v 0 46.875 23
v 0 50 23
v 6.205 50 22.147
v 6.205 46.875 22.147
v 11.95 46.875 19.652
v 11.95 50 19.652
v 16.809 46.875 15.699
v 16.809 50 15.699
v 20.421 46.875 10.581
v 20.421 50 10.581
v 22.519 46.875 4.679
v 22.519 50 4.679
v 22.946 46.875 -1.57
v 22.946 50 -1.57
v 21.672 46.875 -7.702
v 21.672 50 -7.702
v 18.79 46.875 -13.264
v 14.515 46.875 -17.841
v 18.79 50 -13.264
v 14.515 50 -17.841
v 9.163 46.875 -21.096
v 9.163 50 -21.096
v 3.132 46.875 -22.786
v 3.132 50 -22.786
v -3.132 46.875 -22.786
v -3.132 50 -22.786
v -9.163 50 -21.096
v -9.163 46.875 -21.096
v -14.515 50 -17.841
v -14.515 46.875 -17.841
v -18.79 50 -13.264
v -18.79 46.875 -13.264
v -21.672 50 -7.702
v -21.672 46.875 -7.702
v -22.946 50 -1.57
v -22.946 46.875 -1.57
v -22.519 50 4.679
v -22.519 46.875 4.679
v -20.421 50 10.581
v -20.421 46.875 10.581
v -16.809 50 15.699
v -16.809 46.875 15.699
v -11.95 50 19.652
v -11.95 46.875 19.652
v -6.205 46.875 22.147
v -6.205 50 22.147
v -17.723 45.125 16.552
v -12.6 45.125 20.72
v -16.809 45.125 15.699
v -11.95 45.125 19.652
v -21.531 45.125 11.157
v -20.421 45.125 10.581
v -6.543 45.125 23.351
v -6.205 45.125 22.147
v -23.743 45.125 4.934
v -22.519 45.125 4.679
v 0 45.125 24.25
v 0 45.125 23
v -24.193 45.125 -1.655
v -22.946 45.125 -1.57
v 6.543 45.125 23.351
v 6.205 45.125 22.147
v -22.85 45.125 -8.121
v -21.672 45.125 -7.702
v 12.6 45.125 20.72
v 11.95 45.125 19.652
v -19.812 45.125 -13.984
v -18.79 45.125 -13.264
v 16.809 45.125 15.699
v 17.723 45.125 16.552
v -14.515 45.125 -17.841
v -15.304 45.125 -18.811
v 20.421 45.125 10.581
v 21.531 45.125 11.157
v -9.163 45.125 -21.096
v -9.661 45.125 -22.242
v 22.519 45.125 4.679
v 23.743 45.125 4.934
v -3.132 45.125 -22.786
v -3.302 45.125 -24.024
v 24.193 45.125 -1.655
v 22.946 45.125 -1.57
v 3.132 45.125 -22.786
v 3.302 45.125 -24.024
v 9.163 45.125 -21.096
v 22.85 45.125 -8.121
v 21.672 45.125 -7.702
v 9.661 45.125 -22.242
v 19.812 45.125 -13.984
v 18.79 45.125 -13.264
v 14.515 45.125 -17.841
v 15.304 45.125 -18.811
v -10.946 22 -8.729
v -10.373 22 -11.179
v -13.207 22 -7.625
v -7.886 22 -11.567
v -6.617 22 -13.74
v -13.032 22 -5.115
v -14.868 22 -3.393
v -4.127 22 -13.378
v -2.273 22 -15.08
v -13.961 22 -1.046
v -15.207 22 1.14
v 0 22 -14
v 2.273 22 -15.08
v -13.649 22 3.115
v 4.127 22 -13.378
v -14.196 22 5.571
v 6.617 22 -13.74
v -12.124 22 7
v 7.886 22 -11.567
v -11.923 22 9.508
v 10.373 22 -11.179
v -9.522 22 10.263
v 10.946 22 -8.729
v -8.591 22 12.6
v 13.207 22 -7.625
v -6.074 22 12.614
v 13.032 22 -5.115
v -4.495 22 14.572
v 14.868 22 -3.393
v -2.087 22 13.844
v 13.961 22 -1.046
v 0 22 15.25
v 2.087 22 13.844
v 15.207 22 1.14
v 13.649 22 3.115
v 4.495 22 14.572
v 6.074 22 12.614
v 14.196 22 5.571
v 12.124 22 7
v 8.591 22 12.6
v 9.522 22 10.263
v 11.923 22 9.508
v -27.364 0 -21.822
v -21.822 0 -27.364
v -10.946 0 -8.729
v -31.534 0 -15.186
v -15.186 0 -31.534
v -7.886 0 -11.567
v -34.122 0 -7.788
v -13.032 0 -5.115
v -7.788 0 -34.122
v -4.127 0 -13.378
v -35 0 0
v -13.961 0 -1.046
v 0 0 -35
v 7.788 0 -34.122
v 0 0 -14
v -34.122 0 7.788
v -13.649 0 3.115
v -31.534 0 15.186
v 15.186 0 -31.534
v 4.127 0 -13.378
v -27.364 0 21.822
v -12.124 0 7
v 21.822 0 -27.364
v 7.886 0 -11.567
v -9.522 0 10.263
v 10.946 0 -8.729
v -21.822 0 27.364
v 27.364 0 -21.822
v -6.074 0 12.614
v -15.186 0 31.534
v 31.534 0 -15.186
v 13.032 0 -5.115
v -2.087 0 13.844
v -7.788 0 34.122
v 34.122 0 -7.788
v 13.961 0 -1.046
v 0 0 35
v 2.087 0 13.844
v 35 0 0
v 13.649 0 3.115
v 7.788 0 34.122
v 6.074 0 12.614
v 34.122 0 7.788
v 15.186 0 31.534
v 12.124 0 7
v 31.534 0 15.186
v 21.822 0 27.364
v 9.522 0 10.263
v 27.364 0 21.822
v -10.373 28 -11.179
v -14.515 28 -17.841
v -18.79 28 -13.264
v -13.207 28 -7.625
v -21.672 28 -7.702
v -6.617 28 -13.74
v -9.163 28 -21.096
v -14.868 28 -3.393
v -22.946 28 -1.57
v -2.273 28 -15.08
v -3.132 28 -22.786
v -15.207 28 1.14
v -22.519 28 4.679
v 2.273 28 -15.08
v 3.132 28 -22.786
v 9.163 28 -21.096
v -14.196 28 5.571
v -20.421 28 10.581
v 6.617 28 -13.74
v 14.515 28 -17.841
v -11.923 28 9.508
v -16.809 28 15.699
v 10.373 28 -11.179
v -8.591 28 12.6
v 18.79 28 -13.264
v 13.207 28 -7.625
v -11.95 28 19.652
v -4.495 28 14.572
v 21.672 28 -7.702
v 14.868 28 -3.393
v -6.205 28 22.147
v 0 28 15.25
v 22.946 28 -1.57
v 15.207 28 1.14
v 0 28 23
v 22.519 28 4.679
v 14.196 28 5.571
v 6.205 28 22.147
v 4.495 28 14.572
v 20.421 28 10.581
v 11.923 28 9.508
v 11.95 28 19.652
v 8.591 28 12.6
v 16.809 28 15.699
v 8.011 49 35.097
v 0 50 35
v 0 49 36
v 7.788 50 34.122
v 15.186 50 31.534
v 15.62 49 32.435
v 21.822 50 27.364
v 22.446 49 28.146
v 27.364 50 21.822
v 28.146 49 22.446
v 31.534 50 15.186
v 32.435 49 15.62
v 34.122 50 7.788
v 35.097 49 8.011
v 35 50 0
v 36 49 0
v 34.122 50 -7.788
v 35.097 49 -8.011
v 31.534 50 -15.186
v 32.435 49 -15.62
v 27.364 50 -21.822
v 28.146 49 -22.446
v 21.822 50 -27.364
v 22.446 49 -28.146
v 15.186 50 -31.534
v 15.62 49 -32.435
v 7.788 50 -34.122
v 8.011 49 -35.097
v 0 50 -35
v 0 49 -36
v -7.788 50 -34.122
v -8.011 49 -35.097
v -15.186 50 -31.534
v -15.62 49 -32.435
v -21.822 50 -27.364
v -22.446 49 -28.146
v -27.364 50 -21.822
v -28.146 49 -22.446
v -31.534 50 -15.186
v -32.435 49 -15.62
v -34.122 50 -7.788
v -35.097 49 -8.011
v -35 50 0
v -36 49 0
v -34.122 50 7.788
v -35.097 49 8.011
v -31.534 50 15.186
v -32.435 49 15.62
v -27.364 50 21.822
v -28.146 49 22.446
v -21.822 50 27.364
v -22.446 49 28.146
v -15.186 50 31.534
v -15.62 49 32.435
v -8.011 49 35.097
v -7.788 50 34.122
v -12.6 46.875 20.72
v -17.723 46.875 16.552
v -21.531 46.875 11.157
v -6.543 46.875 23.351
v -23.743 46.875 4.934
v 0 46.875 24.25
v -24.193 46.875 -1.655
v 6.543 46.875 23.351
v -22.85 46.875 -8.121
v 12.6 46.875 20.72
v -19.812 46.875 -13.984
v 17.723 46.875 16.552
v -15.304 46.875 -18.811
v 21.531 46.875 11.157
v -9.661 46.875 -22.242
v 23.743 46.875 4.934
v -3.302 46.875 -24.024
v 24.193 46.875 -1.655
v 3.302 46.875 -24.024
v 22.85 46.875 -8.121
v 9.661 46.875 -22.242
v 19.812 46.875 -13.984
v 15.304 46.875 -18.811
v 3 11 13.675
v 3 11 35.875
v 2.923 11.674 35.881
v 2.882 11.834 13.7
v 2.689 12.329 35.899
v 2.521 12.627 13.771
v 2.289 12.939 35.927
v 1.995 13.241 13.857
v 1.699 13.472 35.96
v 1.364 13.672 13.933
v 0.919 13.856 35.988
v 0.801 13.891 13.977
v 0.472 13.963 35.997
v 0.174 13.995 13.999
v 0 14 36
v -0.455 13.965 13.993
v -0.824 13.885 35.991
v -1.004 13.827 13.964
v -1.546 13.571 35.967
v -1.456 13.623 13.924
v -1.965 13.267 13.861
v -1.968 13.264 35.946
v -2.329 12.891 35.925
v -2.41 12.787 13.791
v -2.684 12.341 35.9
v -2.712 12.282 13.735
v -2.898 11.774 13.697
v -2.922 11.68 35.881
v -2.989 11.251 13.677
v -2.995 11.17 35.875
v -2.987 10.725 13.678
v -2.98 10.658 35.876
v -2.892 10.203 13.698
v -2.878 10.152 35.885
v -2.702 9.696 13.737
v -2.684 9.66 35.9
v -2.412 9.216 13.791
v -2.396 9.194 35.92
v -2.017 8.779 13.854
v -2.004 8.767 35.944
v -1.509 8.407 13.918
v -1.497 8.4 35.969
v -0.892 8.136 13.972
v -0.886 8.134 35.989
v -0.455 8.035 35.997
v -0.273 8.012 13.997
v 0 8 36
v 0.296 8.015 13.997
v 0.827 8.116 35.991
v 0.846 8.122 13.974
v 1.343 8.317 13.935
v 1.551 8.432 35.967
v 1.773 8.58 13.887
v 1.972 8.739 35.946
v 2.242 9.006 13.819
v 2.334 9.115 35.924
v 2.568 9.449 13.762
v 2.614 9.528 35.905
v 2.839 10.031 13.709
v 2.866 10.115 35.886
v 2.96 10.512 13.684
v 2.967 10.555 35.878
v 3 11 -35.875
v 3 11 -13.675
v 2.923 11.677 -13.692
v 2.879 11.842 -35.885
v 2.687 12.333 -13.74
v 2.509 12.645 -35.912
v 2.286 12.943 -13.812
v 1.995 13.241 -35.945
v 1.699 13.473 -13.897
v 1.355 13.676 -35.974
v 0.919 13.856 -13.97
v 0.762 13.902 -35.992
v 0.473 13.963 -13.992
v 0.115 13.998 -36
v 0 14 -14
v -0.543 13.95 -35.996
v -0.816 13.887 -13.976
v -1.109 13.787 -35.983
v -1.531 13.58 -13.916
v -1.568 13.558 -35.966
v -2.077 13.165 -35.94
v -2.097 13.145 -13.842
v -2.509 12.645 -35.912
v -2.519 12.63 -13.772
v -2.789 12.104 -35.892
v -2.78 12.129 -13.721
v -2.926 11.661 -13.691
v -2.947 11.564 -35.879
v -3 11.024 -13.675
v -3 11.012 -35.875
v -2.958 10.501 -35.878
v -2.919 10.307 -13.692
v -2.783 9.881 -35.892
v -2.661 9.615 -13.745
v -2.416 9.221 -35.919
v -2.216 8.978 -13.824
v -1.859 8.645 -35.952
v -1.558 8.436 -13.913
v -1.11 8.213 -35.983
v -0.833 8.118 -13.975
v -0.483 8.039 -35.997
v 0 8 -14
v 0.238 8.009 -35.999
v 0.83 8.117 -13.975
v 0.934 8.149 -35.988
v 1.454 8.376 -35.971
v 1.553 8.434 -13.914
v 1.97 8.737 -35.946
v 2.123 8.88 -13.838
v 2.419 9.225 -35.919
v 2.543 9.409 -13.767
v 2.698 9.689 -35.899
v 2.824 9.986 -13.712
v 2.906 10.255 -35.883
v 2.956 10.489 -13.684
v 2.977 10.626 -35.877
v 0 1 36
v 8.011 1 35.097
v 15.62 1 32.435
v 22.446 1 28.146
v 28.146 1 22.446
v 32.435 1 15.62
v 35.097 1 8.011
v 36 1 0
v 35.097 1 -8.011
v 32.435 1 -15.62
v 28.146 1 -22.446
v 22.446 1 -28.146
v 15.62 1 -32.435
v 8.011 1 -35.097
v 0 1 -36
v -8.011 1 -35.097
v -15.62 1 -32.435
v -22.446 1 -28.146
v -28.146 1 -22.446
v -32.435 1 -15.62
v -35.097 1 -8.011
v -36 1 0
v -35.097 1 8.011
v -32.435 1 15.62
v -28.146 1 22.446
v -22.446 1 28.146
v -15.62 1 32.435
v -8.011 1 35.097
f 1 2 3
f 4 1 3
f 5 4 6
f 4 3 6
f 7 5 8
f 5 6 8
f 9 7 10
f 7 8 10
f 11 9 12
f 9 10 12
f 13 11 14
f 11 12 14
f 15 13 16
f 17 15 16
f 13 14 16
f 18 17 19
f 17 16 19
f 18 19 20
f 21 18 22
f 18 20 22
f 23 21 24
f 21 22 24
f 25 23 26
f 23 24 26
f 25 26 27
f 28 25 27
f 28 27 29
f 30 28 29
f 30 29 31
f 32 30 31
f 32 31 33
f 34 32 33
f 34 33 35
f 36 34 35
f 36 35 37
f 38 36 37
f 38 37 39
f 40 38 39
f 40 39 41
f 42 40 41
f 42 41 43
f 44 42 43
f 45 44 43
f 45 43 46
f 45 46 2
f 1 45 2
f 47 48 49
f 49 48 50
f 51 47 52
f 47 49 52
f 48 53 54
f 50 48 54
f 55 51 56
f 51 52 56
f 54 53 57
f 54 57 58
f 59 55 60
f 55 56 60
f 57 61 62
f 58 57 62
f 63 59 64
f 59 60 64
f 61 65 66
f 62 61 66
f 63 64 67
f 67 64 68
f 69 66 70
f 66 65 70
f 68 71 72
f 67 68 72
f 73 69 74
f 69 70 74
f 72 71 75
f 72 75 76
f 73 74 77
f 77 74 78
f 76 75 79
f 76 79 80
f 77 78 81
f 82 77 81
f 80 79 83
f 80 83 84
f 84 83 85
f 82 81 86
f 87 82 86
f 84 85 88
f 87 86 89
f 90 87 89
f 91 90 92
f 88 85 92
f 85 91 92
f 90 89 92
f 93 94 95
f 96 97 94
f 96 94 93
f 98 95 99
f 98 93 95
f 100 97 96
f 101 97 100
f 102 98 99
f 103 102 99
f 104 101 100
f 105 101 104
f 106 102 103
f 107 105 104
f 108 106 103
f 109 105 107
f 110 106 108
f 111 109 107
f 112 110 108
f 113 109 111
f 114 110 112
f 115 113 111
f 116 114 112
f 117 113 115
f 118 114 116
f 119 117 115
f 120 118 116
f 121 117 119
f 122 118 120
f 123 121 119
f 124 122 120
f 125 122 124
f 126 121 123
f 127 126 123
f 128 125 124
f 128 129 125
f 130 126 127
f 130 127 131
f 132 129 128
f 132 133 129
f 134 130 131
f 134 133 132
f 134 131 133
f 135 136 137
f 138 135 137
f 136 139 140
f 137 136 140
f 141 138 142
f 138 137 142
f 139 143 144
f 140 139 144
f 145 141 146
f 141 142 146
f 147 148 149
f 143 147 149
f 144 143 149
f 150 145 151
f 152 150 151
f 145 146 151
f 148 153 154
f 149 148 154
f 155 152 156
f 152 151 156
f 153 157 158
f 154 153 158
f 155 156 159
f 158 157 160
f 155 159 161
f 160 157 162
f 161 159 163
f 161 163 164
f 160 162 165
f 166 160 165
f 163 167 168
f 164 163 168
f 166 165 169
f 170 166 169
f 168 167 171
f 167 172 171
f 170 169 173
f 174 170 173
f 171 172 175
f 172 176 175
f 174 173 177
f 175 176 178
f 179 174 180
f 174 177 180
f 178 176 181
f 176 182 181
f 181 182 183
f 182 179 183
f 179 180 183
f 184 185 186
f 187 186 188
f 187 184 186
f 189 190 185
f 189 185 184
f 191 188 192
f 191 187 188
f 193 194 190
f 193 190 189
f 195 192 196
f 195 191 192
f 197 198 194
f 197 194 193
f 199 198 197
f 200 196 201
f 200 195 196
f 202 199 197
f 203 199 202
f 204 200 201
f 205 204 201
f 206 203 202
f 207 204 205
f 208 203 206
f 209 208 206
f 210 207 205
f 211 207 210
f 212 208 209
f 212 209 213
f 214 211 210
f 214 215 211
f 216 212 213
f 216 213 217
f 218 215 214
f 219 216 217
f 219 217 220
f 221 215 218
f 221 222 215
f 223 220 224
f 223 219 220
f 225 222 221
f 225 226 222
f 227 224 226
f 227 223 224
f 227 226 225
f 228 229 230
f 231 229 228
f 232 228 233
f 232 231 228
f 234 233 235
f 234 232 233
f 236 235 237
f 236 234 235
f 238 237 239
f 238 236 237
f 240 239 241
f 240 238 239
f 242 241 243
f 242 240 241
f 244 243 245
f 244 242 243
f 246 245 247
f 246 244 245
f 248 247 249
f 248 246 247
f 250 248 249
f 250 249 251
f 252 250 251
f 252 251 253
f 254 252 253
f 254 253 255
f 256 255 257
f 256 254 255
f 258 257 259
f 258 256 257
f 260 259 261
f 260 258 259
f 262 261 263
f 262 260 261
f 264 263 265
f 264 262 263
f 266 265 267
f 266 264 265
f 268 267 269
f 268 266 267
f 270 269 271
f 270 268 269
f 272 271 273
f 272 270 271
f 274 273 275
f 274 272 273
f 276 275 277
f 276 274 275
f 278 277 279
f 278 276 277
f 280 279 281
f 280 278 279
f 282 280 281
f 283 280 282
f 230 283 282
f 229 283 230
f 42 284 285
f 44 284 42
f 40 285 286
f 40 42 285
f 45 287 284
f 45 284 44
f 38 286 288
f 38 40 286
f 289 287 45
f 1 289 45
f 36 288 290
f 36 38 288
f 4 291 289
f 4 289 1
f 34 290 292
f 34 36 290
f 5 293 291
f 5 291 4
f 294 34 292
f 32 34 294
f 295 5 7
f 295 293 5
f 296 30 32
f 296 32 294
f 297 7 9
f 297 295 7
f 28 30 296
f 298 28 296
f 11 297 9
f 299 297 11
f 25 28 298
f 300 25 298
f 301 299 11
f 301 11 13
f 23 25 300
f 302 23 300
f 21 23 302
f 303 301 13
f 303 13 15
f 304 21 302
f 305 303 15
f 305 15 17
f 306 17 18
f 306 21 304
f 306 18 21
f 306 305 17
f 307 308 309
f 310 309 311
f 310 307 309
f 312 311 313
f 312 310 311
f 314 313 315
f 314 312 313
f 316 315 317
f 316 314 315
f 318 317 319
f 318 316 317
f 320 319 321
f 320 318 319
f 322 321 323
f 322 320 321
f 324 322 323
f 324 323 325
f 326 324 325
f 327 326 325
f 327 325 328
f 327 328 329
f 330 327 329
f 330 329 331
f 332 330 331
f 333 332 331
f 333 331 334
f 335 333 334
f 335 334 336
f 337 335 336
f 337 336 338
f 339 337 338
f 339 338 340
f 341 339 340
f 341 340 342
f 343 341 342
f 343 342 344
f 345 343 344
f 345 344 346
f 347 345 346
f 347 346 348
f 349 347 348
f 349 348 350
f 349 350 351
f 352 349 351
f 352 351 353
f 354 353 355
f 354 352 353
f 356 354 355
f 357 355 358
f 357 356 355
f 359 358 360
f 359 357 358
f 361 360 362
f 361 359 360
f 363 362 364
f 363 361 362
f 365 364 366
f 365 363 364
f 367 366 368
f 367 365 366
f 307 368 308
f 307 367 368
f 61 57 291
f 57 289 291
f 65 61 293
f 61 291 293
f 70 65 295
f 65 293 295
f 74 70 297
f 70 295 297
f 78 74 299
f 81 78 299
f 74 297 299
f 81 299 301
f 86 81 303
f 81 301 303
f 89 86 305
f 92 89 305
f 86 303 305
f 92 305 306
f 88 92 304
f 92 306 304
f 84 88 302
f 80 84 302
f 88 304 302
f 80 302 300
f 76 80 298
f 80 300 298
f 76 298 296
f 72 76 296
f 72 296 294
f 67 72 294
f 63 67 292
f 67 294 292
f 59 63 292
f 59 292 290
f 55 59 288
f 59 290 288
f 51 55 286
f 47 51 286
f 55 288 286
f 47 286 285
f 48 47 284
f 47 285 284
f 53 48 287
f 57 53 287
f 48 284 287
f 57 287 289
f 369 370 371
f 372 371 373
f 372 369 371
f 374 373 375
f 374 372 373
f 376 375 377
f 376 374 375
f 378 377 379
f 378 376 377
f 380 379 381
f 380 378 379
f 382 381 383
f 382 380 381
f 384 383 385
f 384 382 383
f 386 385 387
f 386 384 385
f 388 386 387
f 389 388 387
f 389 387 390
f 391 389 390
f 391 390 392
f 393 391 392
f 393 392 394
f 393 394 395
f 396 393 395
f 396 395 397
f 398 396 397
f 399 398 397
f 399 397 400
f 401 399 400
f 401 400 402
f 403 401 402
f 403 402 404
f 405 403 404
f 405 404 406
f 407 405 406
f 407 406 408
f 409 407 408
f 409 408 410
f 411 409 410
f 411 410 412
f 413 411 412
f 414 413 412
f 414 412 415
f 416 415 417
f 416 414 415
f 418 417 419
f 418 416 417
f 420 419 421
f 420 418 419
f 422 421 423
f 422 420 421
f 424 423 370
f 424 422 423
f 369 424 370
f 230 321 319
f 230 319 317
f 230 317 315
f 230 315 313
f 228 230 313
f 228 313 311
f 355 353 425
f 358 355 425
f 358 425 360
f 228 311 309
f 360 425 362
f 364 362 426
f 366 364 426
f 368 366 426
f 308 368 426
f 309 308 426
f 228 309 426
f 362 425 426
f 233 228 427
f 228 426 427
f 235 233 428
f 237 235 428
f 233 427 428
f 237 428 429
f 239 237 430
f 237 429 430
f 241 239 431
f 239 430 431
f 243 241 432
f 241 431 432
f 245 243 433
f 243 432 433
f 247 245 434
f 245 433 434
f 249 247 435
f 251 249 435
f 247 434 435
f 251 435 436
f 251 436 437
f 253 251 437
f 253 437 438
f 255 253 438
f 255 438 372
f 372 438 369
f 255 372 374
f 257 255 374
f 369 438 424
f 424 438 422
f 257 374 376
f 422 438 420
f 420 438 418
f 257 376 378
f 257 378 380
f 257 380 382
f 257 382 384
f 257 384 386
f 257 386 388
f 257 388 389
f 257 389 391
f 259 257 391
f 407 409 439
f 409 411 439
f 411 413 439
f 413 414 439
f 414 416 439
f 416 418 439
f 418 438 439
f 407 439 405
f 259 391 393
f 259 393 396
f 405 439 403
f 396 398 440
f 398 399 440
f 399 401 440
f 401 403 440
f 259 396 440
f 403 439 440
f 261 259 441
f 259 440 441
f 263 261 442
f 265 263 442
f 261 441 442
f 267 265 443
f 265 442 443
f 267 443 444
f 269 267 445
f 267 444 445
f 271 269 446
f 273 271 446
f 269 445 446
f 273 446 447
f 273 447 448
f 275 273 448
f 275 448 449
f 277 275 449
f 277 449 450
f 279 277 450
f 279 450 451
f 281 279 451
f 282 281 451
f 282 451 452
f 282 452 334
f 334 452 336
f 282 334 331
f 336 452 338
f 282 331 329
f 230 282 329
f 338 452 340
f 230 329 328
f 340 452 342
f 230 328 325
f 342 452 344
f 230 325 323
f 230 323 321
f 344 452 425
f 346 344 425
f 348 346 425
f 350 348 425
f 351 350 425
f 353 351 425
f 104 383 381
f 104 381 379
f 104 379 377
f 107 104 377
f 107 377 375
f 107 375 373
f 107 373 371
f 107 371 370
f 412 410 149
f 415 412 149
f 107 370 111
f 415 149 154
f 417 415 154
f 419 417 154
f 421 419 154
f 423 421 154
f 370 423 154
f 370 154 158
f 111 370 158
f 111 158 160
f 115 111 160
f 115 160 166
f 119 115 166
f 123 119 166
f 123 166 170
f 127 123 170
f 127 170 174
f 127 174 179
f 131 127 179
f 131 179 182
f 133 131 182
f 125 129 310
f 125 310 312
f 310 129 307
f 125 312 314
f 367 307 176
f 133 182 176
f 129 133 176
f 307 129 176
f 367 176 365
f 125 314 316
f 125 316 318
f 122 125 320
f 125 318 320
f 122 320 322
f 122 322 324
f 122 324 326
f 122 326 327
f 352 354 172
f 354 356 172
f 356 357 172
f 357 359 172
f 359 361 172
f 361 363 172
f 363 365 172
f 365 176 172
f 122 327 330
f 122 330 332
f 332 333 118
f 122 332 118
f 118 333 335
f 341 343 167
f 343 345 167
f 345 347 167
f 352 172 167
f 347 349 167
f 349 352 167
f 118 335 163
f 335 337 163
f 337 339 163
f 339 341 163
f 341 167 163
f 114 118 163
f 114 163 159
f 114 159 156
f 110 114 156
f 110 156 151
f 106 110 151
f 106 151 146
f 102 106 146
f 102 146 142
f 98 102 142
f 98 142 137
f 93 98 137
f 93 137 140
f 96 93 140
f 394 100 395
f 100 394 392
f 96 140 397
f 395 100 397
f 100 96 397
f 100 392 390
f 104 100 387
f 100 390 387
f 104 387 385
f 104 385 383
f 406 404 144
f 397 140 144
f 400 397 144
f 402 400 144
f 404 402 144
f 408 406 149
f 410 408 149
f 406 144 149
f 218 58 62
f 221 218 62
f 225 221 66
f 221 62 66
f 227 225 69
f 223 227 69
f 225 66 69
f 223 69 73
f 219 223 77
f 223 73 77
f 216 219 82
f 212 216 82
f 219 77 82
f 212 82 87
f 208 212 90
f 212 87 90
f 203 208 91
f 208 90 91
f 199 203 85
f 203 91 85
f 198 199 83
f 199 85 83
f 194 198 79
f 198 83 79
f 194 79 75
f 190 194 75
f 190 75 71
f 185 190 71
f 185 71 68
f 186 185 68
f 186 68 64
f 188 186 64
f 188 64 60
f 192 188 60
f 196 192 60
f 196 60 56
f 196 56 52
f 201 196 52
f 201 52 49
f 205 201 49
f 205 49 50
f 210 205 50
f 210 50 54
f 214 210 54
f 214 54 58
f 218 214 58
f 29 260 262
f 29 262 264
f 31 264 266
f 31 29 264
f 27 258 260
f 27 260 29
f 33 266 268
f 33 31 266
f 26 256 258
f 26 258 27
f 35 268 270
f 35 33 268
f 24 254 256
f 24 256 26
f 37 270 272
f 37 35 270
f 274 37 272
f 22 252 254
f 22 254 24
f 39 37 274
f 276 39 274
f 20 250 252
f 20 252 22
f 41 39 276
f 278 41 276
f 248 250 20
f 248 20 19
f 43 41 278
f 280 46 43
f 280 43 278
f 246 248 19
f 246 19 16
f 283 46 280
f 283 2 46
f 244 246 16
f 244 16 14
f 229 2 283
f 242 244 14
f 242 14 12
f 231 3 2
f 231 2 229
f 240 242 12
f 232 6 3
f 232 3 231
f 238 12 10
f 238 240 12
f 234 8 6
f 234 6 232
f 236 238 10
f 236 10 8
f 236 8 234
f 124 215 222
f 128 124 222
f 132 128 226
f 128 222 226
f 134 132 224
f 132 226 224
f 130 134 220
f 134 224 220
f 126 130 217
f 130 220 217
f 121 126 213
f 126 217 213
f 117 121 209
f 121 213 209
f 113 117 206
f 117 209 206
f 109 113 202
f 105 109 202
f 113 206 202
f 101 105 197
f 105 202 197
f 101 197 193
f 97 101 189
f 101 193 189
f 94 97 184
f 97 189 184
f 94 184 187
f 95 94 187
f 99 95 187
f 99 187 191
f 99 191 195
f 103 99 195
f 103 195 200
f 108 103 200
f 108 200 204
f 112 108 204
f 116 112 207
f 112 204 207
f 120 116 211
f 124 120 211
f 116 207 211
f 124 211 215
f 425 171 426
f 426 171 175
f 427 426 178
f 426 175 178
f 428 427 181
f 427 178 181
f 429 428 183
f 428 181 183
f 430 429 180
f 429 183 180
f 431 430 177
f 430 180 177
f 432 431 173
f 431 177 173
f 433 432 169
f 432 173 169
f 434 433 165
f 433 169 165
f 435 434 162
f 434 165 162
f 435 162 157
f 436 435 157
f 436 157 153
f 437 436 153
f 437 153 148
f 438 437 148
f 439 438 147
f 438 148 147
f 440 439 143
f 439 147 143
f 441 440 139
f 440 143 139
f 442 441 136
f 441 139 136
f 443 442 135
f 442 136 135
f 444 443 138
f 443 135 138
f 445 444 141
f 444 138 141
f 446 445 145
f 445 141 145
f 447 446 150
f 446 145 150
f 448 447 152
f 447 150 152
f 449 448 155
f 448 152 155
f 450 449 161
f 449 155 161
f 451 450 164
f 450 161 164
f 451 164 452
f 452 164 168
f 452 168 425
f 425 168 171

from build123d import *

# Parameters (mm, degrees)
SKETCH1_R               = 36
BOSS_EXTRUDE1_DEPTH     = 50
SKETCH2_R               = 23
CUT_EXTRUDE1_DEPTH      = 22
SKETCH3_R               = 14
CUT_EXTRUDE2_DEPTH      = 22
SKETCH4_R               = 15.25
CUT_EXTRUDE3_DEPTH      = 6
SKETCH5_W               = 1.25
SKETCH5_H               = 1.75
CUT_EXTRUDE4_DEPTH      = 72.3582511
CUT_EXTRUDE4_DEPTH_BACK = 72.3582511
SKETCH6_R               = 3
CHAMFER1_SIZE           = 1


with BuildPart() as part:
    # Sketch1 → Boss-Extrude1 (new body)
    with BuildSketch(Plane(origin=(0, 0, 0), x_dir=(1, 0, 0), z_dir=(0, 1, 0))):
        with Locations(Location((0, 0, 0), (0, 0, 270))):
            Circle(SKETCH1_R)
    extrude(amount=BOSS_EXTRUDE1_DEPTH)

    # Sketch2 → Cut-Extrude1 (cut)
    with BuildSketch(Plane(origin=(0, 50, 0), x_dir=(1, 0, 0), z_dir=(0, 1, 0))):
        with Locations(Location((0, 0, 0), (0, 0, 270))):
            Circle(SKETCH2_R)
    extrude(amount=-CUT_EXTRUDE1_DEPTH, mode=Mode.SUBTRACT)

    # Sketch3 → Cut-Extrude2 (cut)
    with BuildSketch(Plane.XZ):
        with Locations(Location((0, 0, 0), (0, 0, 270))):
            Circle(SKETCH3_R)
    extrude(amount=-CUT_EXTRUDE2_DEPTH, mode=Mode.SUBTRACT)

    # Sketch4 → Cut-Extrude3 (cut)
    with BuildSketch(Plane(origin=(0, 28, 0), x_dir=(1, 0, 0), z_dir=(0, 1, 0))):
        with Locations(Location((0, 0, 0), (0, 0, 270))):
            Circle(SKETCH4_R)
    extrude(amount=-CUT_EXTRUDE3_DEPTH, mode=Mode.SUBTRACT)

    # Sketch5 → Cut-Revolve1 (revolve, cut)
    with BuildSketch(Plane.XY, mode=Mode.PRIVATE) as cut_revolve1_sk:
        with Locations((23.625, 46)):
            Rectangle(SKETCH5_W, SKETCH5_H)
    revolve(cut_revolve1_sk.sketch.rotate(Axis((0, 0, 0), (0, 1, 0)), 270), axis=Axis((0, 0, 0), (0, 1, 0)), mode=Mode.SUBTRACT)

    # Sketch6 → Cut-Extrude4 (cut, two sides: drawn at the far end of the back side and taken through both)
    with BuildSketch(Plane.XY.offset(-CUT_EXTRUDE4_DEPTH_BACK)):
        with Locations((0, 11)):
            Circle(SKETCH6_R)
    extrude(amount=CUT_EXTRUDE4_DEPTH + CUT_EXTRUDE4_DEPTH_BACK, mode=Mode.SUBTRACT)

    # Chamfer1
    chamfer1_edges = [part.edges().sort_by_distance(p)[0] for p in [
        (0, 0, -36),
        (0, 50, -36),
    ]]
    chamfer(chamfer1_edges, length=CHAMFER1_SIZE)


solid = part.part
